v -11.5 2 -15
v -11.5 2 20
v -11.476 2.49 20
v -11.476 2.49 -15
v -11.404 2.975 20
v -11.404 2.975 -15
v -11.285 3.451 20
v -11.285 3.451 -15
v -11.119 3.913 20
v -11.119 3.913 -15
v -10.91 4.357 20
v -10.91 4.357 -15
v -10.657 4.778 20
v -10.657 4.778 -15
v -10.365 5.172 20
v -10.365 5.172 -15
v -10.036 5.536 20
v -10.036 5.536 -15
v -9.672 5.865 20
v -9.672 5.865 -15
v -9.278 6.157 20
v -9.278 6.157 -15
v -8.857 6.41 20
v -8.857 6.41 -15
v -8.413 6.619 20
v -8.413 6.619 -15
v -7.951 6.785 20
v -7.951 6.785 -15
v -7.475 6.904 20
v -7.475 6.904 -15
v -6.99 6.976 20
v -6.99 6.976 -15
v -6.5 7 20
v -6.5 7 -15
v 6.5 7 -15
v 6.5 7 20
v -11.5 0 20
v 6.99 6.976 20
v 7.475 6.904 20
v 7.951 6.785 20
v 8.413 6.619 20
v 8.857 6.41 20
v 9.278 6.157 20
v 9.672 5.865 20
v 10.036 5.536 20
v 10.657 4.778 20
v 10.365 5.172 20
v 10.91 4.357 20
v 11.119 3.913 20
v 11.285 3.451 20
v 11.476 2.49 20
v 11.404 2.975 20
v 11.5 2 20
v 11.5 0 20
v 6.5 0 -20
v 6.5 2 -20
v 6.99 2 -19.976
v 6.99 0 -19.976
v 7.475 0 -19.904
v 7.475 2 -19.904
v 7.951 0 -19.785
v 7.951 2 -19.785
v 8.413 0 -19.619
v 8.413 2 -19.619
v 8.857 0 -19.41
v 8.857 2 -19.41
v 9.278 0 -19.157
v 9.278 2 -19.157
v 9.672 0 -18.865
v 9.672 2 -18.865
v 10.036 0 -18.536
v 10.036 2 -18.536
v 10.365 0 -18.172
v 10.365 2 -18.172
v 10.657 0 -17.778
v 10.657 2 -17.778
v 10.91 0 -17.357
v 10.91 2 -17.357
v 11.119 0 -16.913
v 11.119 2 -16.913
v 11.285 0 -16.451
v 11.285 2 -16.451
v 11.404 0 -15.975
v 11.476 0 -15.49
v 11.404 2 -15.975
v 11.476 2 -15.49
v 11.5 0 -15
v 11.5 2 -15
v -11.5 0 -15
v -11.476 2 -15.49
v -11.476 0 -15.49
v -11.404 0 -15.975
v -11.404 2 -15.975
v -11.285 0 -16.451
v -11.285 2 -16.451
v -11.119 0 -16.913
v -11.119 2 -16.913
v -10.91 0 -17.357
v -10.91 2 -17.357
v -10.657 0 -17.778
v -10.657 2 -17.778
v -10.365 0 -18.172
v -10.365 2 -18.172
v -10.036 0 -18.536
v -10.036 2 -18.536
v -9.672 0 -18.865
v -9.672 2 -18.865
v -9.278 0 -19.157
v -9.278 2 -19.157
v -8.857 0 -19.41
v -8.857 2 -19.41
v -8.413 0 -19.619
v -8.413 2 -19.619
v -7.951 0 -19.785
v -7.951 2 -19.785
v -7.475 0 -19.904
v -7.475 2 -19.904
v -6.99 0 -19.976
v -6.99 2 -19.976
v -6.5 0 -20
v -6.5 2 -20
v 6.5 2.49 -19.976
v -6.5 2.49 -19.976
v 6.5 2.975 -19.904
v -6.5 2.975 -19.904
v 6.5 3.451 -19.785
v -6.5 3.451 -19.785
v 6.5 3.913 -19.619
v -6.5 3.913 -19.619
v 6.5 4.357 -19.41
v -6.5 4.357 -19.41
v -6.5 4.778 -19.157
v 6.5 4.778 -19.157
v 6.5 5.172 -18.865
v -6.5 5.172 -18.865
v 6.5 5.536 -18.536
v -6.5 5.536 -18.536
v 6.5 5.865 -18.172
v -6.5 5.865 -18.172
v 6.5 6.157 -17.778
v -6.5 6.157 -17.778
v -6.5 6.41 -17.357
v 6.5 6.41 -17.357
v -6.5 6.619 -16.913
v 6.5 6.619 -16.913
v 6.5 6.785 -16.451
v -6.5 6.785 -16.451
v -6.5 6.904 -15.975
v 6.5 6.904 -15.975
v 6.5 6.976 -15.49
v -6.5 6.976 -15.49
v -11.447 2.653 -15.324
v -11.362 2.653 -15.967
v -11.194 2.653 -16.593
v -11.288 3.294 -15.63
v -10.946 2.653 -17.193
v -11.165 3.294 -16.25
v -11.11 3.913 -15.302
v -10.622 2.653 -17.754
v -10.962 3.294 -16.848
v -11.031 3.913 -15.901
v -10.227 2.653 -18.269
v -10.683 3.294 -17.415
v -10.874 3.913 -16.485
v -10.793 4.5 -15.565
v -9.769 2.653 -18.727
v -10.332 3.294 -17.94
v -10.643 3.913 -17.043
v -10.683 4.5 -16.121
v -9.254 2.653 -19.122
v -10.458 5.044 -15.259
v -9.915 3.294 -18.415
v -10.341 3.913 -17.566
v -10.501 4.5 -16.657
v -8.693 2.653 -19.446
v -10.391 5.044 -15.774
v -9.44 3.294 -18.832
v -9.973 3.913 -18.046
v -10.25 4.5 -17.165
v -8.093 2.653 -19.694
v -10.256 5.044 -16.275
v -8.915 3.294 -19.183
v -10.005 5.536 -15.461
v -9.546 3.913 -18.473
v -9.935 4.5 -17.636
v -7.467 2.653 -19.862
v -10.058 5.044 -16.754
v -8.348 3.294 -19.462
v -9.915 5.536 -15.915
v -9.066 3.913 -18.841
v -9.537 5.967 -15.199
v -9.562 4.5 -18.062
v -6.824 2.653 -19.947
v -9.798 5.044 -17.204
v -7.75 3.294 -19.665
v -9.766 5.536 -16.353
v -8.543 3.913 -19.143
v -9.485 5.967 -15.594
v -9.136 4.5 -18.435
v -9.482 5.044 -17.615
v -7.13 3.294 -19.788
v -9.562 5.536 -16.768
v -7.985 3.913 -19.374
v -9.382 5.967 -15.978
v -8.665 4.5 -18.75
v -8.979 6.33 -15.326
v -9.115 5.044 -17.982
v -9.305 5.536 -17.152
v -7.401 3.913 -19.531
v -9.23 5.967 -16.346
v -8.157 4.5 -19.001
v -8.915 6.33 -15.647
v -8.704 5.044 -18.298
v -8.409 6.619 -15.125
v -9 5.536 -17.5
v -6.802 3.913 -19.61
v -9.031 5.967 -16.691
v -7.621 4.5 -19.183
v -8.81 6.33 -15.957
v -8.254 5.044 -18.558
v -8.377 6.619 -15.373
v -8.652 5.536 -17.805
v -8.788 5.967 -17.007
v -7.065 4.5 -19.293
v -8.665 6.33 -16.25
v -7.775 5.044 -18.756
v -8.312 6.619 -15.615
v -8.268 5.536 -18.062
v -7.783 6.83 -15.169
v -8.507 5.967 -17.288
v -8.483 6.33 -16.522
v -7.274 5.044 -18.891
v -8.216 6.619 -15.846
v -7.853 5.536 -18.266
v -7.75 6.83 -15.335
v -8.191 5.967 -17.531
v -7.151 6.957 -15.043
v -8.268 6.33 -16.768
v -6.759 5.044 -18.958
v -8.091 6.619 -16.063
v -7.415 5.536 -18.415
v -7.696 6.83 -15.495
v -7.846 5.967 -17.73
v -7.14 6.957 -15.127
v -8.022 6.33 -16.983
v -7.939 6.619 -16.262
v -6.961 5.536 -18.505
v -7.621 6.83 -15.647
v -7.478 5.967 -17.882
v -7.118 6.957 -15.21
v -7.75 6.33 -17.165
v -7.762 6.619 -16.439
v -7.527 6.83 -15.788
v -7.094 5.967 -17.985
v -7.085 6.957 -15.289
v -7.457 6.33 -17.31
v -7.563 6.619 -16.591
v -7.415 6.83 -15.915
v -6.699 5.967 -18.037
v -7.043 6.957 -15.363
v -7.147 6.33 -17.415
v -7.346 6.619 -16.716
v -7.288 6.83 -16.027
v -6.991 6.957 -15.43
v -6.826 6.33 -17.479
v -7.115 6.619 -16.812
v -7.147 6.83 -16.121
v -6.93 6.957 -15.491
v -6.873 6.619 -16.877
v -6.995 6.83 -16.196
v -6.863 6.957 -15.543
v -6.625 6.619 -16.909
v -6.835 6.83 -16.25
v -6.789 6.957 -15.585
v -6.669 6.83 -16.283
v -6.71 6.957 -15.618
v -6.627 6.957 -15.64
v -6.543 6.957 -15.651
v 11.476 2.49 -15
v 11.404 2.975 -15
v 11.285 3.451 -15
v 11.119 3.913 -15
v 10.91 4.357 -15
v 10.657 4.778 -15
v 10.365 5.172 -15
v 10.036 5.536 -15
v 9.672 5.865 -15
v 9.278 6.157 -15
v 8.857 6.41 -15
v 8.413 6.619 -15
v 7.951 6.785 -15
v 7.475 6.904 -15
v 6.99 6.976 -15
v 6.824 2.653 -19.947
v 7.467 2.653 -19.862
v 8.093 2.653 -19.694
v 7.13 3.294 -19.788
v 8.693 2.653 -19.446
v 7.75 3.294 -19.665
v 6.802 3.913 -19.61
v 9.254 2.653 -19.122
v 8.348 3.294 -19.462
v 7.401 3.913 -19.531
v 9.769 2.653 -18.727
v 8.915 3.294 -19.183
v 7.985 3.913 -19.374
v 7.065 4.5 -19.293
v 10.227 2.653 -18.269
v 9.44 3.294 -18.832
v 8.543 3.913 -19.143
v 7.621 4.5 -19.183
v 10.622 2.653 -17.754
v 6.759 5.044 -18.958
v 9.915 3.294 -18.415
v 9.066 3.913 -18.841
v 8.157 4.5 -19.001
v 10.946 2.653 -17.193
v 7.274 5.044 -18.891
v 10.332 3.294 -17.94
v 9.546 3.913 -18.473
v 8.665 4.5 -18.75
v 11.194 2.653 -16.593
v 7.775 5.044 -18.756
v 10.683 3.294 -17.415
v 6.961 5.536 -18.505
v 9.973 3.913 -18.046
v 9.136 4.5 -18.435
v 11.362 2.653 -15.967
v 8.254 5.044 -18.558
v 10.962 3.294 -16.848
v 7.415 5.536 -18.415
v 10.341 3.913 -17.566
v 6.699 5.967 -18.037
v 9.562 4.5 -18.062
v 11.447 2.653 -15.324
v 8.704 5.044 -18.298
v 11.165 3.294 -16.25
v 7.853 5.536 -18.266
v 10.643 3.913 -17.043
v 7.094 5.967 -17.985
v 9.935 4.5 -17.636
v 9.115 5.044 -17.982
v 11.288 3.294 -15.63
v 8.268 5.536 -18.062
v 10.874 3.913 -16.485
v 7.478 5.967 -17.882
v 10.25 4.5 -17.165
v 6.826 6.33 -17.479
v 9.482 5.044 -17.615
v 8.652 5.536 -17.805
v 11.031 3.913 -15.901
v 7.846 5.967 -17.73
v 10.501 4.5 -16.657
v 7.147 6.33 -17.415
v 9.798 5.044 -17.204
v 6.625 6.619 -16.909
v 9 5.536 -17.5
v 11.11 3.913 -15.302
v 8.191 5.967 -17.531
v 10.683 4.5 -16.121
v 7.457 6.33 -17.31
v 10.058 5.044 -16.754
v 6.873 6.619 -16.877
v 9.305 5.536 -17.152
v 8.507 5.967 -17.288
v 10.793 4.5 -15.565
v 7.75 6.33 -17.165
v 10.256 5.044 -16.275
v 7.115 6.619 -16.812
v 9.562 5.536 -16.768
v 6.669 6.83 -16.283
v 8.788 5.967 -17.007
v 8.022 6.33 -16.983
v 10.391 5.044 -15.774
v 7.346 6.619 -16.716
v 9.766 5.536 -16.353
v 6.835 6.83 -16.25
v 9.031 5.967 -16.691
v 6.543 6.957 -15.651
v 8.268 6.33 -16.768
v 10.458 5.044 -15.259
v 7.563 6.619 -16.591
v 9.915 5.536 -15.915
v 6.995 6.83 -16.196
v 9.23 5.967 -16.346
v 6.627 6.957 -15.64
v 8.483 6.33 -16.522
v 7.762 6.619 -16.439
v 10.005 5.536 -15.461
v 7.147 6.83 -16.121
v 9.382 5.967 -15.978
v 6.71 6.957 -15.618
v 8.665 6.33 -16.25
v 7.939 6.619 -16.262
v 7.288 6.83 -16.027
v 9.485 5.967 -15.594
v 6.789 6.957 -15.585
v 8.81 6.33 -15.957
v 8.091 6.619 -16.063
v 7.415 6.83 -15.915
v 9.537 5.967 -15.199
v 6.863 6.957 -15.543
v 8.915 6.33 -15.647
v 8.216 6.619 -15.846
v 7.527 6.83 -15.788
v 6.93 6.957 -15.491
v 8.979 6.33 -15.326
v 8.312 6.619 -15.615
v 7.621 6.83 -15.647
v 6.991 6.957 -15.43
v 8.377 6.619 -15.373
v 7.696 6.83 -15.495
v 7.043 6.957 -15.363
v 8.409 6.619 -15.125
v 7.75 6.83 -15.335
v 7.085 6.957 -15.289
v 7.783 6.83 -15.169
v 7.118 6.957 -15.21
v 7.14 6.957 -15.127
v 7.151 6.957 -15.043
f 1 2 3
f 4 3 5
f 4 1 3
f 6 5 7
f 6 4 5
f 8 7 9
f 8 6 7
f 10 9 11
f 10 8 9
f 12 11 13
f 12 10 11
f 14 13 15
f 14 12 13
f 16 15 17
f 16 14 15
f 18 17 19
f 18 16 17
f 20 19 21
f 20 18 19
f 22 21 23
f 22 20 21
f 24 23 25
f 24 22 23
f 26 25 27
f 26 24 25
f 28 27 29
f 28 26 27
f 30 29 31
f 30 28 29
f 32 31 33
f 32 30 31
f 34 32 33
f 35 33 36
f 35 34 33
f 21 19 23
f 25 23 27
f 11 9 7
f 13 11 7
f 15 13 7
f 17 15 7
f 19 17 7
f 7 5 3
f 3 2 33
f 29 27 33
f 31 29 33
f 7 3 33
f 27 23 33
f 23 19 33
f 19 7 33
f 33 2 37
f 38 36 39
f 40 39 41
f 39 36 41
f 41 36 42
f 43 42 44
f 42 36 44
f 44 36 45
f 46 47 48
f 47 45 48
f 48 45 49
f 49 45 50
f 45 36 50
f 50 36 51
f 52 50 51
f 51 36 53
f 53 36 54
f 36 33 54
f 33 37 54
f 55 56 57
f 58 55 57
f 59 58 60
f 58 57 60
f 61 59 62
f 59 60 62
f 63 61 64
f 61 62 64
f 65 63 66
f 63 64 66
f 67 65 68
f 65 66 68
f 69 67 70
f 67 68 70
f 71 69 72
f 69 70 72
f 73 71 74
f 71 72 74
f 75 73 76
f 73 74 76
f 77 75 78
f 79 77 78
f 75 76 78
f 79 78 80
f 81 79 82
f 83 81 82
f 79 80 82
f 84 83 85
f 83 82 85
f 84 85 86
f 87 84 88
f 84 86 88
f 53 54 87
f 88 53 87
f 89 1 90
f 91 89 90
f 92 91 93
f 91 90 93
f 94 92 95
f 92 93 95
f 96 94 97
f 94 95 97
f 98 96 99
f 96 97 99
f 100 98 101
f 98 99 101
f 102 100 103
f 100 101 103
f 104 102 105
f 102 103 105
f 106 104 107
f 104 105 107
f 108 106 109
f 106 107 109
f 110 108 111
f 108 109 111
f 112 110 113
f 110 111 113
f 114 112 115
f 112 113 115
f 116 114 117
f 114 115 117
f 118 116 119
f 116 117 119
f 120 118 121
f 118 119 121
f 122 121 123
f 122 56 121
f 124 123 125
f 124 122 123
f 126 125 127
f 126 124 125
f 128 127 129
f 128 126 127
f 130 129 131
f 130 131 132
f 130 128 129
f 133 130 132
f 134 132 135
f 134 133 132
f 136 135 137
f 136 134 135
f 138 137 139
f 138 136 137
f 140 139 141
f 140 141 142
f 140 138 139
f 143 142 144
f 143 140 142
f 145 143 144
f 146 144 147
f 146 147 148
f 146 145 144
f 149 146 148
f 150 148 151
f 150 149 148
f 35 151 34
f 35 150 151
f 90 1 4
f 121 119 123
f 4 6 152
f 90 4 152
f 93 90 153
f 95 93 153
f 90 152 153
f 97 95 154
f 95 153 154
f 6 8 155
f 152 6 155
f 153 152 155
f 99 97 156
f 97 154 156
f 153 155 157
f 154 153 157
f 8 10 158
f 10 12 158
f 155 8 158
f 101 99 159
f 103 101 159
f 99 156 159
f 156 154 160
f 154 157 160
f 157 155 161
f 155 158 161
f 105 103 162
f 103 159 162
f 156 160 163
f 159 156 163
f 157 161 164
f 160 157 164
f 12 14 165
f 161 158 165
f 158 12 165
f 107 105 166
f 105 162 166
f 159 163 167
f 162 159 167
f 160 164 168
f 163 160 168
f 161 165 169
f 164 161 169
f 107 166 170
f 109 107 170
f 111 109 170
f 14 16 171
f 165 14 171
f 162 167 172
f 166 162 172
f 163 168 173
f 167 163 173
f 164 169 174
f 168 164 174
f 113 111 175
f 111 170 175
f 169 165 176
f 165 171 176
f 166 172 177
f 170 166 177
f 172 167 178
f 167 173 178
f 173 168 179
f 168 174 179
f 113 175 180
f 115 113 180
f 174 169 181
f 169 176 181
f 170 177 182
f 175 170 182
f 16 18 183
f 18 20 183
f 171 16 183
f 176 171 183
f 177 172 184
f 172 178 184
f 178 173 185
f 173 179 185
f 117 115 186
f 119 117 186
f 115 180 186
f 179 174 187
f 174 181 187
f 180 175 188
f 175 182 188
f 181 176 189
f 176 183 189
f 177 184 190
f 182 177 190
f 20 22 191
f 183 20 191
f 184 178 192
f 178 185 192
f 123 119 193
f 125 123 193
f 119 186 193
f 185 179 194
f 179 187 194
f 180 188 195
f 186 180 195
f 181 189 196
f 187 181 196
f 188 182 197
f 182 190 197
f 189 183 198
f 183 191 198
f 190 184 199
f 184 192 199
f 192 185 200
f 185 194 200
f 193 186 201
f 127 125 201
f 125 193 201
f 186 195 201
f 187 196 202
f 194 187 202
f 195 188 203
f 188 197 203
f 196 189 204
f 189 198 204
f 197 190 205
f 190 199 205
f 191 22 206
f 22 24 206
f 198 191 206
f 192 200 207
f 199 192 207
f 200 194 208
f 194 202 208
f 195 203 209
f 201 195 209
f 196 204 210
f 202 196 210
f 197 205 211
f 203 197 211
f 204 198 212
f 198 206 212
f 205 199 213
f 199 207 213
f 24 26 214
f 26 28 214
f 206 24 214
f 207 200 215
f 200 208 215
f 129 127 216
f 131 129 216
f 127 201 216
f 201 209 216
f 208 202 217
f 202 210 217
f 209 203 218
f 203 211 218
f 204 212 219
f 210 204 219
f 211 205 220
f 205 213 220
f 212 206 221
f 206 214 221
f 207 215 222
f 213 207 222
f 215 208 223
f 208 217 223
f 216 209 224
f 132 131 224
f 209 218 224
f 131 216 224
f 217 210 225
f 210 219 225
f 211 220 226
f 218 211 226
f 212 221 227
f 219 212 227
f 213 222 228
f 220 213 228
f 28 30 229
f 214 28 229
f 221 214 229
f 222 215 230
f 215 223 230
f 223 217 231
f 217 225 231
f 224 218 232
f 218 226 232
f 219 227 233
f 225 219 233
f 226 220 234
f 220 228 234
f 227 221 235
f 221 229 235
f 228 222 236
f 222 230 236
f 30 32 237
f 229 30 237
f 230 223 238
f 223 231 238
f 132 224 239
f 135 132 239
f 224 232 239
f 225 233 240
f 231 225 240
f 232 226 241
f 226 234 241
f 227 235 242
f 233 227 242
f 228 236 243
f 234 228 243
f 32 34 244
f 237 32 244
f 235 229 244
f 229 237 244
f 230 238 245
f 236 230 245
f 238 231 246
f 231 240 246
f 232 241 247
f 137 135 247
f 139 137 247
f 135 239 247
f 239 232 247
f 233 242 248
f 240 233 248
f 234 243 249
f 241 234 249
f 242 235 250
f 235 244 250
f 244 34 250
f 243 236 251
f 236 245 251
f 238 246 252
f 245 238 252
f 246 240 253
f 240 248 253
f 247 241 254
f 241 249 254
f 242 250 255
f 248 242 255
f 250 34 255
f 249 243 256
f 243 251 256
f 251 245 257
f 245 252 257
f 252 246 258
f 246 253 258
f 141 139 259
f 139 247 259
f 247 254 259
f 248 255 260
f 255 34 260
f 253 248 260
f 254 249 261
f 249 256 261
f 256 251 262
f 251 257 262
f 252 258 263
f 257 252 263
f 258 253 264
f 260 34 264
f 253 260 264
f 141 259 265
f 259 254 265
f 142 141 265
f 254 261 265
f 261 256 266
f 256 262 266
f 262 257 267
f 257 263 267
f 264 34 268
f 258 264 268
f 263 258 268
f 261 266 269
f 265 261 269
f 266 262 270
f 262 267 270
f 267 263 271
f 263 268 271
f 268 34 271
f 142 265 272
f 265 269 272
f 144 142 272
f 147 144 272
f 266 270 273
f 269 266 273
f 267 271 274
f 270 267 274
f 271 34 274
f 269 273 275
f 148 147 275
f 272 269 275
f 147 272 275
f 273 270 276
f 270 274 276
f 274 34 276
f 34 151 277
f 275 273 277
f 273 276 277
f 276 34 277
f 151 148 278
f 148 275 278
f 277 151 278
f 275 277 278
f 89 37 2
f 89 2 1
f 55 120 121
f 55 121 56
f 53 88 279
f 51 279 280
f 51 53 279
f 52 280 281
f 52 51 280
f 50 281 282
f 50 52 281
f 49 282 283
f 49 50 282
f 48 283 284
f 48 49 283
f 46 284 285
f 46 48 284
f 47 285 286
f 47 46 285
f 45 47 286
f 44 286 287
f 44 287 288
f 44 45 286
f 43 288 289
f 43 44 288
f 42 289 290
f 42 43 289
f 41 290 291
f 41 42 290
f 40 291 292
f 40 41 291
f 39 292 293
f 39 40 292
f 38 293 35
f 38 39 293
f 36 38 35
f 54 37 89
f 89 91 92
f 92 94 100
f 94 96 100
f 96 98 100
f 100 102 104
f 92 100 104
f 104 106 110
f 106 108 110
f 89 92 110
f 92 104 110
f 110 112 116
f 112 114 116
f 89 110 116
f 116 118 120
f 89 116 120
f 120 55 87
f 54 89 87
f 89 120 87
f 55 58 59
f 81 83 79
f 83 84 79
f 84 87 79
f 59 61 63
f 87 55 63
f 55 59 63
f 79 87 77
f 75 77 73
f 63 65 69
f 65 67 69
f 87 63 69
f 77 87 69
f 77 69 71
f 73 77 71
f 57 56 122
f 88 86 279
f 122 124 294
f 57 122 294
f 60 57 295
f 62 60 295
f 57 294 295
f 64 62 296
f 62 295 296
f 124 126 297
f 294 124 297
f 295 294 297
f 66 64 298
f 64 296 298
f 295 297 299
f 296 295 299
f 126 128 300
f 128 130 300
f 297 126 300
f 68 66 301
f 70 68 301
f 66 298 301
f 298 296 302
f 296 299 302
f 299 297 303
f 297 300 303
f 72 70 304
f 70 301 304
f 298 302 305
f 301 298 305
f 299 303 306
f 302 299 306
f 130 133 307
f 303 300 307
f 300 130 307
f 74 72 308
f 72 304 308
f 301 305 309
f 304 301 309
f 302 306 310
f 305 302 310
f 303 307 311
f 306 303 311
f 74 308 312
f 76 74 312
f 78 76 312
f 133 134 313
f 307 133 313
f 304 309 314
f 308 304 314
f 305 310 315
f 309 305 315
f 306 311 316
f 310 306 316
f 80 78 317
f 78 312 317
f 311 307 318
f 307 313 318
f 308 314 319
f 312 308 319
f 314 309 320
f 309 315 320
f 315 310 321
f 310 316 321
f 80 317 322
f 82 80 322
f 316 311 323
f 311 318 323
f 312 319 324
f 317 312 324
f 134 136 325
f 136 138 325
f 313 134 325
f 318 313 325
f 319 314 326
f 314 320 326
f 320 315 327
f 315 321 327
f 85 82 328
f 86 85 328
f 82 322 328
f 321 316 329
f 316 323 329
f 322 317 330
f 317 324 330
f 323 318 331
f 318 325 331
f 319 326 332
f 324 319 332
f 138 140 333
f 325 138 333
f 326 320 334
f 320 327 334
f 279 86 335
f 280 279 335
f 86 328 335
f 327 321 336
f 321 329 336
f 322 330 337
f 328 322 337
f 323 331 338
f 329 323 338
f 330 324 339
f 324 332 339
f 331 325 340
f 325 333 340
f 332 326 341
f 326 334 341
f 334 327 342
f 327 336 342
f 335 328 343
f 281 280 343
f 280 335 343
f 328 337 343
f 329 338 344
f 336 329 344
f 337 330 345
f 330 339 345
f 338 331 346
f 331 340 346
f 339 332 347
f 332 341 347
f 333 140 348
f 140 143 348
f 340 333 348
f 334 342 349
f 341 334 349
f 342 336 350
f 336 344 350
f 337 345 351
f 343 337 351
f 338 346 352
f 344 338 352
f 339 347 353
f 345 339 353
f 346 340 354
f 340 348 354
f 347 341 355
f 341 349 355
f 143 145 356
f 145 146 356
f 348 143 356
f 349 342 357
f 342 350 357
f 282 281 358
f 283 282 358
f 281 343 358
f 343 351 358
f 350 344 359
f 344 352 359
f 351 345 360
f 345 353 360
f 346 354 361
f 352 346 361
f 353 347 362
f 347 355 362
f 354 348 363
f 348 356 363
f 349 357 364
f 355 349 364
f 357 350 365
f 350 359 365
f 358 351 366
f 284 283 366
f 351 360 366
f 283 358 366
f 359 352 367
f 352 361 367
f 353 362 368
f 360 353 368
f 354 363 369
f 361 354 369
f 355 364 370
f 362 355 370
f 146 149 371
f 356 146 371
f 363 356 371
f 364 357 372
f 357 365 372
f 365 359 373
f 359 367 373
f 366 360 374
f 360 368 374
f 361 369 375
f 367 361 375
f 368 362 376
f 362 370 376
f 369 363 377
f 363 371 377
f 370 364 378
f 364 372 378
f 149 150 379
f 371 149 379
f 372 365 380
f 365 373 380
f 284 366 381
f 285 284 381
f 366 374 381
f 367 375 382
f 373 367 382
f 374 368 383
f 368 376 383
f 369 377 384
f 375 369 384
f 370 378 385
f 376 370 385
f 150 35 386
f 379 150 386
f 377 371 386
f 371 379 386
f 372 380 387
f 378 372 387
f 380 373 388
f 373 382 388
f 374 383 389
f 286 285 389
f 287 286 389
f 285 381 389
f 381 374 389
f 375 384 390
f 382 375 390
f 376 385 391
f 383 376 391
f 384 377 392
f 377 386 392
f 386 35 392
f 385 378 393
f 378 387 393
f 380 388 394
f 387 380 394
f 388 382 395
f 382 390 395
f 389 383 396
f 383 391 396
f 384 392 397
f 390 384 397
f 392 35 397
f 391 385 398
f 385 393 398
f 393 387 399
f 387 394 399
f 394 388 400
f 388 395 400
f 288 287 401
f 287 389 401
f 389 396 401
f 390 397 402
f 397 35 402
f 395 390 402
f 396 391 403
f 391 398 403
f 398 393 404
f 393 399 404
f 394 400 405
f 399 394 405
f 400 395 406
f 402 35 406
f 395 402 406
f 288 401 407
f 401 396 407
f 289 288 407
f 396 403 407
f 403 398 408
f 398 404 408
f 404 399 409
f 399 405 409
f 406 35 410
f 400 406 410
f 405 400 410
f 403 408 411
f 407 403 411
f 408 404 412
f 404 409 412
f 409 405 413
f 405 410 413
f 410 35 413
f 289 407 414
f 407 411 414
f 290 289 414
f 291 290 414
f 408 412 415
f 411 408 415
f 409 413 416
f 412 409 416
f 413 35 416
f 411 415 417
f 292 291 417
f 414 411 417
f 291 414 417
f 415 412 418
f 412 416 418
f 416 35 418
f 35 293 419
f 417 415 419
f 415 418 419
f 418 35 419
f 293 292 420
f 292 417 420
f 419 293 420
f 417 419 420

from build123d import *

# Parameters (mm, degrees)
SKETCH1_W           = 23
SKETCH1_H           = 40
BOSS_EXTRUDE1_DEPTH = 7
FILLET1_R           = 5
FILLET2_R           = 5
FILLET3_R           = 5


with BuildPart() as part:
    # Sketch1 → Boss-Extrude1 (new body)
    with BuildSketch(Plane(origin=(0, 0, 0), x_dir=(1, 0, 0), z_dir=(0, 1, 0))):
        Rectangle(SKETCH1_W, SKETCH1_H)
    extrude(amount=BOSS_EXTRUDE1_DEPTH)

    # Fillet1
    fillet1_edges = [part.edges().sort_by_distance(p)[0] for p in [
        (-11.5, 3.5, -20),
    ]]
    fillet(fillet1_edges, radius=FILLET1_R)

    # Fillet2
    fillet2_edges = [part.edges().sort_by_distance(p)[0] for p in [
        (11.5, 3.5, -20),
    ]]
    fillet(fillet2_edges, radius=FILLET2_R)

    # Fillet3
    fillet3_edges = [part.edges().sort_by_distance(p)[0] for p in [
        (-11.5, 7, 2.5),
        (-10.035533906, 7, -18.535533906),
        (0, 7, -20),
        (10.035533906, 7, -18.535533906),
        (11.5, 7, 2.5),
    ]]
    fillet(fillet3_edges, radius=FILLET3_R)


solid = part.part
